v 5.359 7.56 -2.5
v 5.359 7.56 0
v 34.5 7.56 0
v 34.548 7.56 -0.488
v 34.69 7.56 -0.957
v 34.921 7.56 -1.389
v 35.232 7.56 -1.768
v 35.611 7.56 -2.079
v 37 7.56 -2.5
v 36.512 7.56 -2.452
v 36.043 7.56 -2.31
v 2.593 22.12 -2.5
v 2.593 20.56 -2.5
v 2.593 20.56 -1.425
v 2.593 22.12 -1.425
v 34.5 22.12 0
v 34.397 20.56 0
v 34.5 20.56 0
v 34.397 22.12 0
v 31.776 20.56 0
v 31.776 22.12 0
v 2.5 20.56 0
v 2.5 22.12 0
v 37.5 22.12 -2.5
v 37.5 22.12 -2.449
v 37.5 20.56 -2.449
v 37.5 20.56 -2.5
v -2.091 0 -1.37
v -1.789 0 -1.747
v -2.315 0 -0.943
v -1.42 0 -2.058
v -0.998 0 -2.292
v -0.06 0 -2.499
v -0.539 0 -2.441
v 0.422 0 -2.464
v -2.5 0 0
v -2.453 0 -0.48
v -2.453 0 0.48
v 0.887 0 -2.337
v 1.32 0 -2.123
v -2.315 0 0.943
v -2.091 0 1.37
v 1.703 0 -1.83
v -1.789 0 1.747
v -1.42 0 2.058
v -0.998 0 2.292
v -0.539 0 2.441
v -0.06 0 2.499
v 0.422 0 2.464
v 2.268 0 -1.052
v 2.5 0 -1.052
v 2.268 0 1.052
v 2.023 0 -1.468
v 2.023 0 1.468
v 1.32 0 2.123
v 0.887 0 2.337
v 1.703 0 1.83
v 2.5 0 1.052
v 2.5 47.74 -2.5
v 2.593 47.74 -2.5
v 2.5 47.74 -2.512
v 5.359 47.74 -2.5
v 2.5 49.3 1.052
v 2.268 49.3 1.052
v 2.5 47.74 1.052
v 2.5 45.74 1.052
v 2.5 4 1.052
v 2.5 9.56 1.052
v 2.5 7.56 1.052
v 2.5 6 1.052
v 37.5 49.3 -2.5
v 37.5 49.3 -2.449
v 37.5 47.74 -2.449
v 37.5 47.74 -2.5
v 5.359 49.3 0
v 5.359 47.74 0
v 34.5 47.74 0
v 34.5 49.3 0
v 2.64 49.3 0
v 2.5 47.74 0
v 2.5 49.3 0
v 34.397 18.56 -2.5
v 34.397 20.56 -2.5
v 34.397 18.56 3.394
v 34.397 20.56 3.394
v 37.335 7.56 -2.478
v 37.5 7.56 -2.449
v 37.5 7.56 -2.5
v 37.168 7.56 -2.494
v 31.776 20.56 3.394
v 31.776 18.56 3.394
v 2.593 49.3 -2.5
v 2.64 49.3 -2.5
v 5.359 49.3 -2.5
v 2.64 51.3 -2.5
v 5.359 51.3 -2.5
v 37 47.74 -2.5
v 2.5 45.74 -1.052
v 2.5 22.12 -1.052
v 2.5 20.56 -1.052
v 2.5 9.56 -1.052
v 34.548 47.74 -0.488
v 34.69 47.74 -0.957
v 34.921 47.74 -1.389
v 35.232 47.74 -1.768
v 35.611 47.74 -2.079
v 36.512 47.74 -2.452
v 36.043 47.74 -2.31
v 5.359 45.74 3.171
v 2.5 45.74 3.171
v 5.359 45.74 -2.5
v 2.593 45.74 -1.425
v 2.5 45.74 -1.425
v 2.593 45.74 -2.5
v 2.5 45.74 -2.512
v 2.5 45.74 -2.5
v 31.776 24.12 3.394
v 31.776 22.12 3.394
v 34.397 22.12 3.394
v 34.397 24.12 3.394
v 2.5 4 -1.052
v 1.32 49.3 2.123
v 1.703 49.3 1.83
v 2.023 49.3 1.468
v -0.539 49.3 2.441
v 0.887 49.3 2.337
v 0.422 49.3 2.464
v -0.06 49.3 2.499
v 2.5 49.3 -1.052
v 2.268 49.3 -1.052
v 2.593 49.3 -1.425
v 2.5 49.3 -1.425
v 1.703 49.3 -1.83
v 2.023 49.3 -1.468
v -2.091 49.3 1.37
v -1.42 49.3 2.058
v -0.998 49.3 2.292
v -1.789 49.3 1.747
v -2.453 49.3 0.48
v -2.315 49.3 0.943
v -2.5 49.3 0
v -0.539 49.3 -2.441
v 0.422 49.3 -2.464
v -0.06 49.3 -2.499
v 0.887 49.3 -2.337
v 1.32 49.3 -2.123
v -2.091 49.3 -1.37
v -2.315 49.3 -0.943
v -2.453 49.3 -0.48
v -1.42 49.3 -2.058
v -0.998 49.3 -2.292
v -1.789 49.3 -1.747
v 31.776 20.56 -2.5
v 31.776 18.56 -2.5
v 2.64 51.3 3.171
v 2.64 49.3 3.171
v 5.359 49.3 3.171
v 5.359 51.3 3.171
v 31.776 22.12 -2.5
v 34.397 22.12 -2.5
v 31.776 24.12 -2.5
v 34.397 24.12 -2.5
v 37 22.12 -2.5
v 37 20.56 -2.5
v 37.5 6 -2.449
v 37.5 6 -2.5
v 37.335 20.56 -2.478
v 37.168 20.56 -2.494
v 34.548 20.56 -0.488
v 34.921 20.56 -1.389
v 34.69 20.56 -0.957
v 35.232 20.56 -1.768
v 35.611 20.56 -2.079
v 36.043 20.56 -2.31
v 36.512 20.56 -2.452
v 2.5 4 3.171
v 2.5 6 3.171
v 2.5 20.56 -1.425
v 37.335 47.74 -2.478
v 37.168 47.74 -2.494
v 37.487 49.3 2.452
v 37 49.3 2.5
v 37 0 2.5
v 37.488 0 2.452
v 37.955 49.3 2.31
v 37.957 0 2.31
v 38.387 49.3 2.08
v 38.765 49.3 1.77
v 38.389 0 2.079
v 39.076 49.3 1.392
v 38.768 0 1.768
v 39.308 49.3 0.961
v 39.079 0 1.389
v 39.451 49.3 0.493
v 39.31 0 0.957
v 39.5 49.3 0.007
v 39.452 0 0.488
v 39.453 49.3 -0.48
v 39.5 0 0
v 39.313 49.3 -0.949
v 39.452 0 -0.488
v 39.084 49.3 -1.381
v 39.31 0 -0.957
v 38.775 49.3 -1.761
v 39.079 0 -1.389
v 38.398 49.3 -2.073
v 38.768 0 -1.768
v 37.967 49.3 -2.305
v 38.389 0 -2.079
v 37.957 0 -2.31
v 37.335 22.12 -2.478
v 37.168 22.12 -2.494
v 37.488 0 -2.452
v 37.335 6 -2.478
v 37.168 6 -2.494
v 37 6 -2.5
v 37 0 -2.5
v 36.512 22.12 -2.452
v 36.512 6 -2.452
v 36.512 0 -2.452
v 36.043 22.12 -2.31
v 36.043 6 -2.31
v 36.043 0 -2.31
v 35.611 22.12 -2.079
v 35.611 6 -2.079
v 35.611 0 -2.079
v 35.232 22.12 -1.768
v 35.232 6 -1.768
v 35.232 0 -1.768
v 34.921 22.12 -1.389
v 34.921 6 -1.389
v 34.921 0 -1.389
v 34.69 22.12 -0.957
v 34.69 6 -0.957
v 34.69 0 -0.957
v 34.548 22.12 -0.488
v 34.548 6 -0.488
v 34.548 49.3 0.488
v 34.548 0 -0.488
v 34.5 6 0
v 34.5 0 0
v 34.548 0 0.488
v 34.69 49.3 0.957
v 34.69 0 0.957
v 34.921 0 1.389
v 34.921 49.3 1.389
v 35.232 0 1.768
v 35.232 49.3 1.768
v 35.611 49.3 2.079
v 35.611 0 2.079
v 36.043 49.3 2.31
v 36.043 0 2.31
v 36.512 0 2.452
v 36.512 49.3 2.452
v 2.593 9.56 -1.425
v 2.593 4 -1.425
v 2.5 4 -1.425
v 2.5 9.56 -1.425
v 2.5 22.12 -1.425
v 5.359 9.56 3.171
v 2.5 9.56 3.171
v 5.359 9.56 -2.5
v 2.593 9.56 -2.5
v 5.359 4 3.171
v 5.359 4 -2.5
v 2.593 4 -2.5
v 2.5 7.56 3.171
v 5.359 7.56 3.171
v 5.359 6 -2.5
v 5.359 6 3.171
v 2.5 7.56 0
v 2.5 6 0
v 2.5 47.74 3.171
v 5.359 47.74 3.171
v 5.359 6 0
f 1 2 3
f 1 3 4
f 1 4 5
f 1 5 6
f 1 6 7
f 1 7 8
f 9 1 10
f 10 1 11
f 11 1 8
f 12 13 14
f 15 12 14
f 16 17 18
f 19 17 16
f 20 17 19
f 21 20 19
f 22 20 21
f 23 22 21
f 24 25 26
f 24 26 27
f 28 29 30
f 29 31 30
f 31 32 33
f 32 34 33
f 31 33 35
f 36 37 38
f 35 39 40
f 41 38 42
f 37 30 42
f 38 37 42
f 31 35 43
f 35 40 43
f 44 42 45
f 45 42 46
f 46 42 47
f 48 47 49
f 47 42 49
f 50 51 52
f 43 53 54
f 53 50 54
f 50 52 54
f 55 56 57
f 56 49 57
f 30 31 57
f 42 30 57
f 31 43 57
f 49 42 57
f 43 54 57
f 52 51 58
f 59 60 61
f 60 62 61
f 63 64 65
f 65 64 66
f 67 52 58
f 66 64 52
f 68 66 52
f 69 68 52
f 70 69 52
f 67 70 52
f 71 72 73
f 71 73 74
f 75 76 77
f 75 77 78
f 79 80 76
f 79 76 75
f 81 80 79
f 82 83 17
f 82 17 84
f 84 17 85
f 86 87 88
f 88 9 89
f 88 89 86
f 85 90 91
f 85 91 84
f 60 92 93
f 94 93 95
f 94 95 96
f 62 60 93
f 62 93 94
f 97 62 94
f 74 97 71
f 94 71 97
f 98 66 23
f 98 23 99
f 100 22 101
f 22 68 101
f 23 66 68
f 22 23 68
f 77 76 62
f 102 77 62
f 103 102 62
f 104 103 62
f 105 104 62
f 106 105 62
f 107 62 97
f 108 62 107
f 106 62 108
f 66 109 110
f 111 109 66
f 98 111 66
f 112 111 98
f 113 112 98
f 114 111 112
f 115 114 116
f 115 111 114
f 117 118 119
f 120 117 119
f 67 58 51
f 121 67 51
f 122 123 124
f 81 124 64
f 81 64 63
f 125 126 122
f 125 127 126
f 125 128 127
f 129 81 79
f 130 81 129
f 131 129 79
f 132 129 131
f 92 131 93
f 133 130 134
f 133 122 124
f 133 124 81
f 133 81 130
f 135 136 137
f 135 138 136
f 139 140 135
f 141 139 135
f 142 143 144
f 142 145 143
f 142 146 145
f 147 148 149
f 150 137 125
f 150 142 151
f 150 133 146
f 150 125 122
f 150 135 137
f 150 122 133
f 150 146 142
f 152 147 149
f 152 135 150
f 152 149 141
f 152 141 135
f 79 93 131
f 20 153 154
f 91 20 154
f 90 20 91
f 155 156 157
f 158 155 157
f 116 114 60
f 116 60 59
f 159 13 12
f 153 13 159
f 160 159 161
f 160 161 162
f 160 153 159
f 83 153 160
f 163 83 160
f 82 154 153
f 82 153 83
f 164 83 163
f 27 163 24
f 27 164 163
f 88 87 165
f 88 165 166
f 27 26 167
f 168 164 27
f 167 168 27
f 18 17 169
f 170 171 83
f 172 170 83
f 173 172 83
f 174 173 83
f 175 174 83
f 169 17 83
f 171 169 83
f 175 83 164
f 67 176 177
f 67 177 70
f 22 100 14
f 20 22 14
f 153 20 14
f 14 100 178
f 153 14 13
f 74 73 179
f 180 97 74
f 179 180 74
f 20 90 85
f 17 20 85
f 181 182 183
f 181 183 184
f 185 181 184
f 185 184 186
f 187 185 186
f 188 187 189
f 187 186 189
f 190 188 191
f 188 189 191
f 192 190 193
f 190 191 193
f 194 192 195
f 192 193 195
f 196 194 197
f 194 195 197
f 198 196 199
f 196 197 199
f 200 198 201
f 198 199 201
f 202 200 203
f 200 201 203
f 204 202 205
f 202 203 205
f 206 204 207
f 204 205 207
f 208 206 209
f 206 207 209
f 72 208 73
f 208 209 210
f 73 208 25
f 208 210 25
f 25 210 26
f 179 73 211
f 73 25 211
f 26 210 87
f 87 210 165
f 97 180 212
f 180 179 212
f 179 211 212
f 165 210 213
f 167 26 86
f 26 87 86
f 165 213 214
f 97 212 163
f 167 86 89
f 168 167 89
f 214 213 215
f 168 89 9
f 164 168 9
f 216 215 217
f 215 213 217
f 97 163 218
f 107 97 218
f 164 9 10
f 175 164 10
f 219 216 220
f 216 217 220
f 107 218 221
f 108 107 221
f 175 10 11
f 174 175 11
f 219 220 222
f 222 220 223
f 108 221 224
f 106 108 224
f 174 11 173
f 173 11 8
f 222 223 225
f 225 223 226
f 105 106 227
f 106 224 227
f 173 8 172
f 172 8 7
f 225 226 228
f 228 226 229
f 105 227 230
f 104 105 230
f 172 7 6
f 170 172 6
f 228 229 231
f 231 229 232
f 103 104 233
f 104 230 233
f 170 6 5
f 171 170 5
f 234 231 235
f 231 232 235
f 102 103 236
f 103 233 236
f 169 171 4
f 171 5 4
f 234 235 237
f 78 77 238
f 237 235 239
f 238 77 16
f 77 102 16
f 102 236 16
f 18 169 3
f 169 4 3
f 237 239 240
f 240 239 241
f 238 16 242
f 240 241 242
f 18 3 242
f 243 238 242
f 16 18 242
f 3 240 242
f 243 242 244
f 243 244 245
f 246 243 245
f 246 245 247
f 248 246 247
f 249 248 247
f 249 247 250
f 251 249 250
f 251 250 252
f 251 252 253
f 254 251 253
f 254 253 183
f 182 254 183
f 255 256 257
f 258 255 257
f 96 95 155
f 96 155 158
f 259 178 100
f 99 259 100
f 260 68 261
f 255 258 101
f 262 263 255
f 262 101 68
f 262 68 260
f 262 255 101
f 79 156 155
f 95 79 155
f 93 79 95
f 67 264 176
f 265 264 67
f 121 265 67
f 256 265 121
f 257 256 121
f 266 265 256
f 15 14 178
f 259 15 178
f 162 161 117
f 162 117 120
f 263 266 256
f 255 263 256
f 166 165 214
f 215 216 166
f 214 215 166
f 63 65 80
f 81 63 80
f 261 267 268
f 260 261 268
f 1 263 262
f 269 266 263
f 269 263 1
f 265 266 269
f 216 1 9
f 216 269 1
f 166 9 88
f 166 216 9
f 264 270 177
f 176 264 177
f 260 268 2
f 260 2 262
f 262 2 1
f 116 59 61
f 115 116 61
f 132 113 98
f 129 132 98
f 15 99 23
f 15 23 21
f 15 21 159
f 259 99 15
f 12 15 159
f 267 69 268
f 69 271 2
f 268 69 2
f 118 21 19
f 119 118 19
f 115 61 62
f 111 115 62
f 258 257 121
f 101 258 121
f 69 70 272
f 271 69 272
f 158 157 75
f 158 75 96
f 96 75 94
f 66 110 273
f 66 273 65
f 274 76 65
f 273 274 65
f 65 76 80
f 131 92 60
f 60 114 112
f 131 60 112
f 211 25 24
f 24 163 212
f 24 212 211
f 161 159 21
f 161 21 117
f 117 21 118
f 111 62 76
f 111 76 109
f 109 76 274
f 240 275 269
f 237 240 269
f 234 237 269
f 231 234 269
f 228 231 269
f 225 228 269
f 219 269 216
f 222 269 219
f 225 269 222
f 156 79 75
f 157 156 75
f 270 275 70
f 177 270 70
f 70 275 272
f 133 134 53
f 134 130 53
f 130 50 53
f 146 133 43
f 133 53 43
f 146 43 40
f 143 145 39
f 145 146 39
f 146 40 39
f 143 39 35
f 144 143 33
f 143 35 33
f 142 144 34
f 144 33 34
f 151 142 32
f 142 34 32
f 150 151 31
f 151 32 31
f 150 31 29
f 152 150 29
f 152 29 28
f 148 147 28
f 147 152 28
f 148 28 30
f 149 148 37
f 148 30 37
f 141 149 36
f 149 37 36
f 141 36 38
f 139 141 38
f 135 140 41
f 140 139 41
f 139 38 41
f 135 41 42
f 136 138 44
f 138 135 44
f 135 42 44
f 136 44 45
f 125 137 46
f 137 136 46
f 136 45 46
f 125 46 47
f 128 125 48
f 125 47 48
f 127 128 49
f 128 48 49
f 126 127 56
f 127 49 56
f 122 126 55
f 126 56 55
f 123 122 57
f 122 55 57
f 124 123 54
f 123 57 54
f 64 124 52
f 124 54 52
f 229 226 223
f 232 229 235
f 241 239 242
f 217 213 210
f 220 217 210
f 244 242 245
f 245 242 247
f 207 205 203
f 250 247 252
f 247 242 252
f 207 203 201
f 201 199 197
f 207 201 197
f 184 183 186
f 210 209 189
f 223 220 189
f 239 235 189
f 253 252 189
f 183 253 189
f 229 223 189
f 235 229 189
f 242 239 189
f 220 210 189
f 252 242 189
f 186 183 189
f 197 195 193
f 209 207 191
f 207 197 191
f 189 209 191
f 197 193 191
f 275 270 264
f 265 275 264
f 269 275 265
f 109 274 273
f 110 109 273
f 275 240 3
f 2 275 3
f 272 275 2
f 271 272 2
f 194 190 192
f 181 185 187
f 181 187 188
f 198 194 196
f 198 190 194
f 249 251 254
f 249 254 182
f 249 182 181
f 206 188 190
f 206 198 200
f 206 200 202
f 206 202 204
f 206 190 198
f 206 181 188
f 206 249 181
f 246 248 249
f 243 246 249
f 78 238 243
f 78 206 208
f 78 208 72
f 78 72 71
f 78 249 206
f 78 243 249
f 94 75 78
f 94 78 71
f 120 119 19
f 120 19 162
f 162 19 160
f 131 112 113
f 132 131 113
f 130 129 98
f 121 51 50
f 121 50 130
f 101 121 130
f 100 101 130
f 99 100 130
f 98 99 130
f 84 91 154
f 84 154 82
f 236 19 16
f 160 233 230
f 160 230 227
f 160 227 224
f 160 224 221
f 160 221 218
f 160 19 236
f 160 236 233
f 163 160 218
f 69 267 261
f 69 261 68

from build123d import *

# Parameters (mm, degrees)
SKETCH2_R             = 2.5
BOSS_EXTRUDE1_DEPTH   = 49.3
BOSS_EXTRUDE1_2_DEPTH = 49.3
BOSS_EXTRUDE2_DEPTH   = 49.3
SKETCH4_W             = 2.5
SKETCH4_H             = 1.56
BOSS_EXTRUDE4_DEPTH   = 35
BOSS_EXTRUDE8_DEPTH   = 2
SKETCH15_W            = 2.621045261
SKETCH15_H            = 5.894157502
BOSS_EXTRUDE10_DEPTH  = 2
SKETCH16_W            = 2.858555501
SKETCH16_H            = 5.670918984
BOSS_EXTRUDE11_DEPTH  = 2
SKETCH17_W            = 2.858555501
SKETCH17_H            = 5.670918984
BOSS_EXTRUDE12_DEPTH  = 2
BOSS_EXTRUDE13_DEPTH  = 2
SKETCH21_W            = 2.718681831
SKETCH21_H            = 5.670918984
BOSS_EXTRUDE16_DEPTH  = 2
SKETCH22_W            = 0.232218322
SKETCH22_H            = 1.447780317
CUT_EXTRUDE3_DEPTH    = 49.4


with BuildPart() as part:
    # Sketch2 → Boss-Extrude1 (new body)
    with BuildSketch(Plane(origin=(0, 0, 0), x_dir=(1, 0, 0), z_dir=(0, 1, 0))):
        with Locations(Location((0, 0, 0), (0, 0, 270))):
            Circle(SKETCH2_R)
    extrude(amount=BOSS_EXTRUDE1_DEPTH)

    # Sketch3 → Boss-Extrude2 (add)
    with BuildSketch(Plane(origin=(0, 0, 0), x_dir=(1, 0, 0), z_dir=(0, 1, 0))):
        with BuildLine():
            Line((2.5, 0), (2.499588142, -0.045377544))
            ThreePointArc((2.499588142, -0.045377544), (2.436264871, -0.560904161), (2.267781678, -1.052219683))
            Line((2.267781678, -1.052219683), (2.267781678, -2.5))
            Line((2.267781678, -2.5), (2.5, -2.5))
            Line((2.5, -2.5), (2.5, 0))
        make_face()
        with BuildLine():
            ThreePointArc((2.267781678, 1.052219683), (2.44125523, 0.538769805), (2.5, 0))
            Line((2.5, 0), (2.5, 2.5))
            Line((2.5, 2.5), (2.267781678, 2.5))
            Line((2.267781678, 2.5), (2.267781678, 1.052219683))
        make_face()
    extrude(amount=BOSS_EXTRUDE2_DEPTH)



with BuildPart() as body_2:
    # Sketch2 → Boss-Extrude1 2 (new body)
    with BuildSketch(Plane(origin=(0, 0, 0), x_dir=(1, 0, 0), z_dir=(0, 1, 0))):
        with Locations(Location((37, 0, 0), (0, 0, 270))):
            Circle(SKETCH2_R)
    extrude(amount=BOSS_EXTRUDE1_2_DEPTH)


with BuildPart() as part_1:
    add(part.part)

    add(body_2.part)  # Boss-Extrude4 merges body 2
    # Sketch4 → Boss-Extrude4 (add)
    with BuildSketch(Plane(origin=(2.5, 0, 0), x_dir=(0, 0, -1), z_dir=(1, 0, 0))):
        with Locations((1.25, 48.52)):
            Rectangle(SKETCH4_W, SKETCH4_H)
        with Locations((1.25, 21.34)):
            Rectangle(SKETCH4_W, SKETCH4_H)
        with Locations((1.25, 6.78)):
            Rectangle(SKETCH4_W, SKETCH4_H)
    extrude(amount=BOSS_EXTRUDE4_DEPTH)

    # Sketch10 → Boss-Extrude8 (add)
    with BuildSketch(Plane(origin=(0, 22.12, 0), x_dir=(1, 0, 0), z_dir=(0, 1, 0))):
        Polygon((31.775974476, 2.5), (31.775974476, -0.65349723), (31.775974476, -2.529631849), (31.775974476, -3.394157502), (34.397019737, -3.394157502), (34.397019737, -2.529631849), (34.397019737, -0.644583093), (34.397019737, 2.5), align=None)
    extrude(amount=BOSS_EXTRUDE8_DEPTH)

    # Sketch15 → Boss-Extrude10 (add)
    with BuildSketch(Plane.XZ.offset(-20.56)):
        with Locations((33.086497107, 0.447078751)):
            Rectangle(SKETCH15_W, SKETCH15_H)
    extrude(amount=BOSS_EXTRUDE10_DEPTH)

    # Sketch16 → Boss-Extrude11 (add)
    with BuildSketch(Plane(origin=(0, 7.56, 0), x_dir=(1, 0, 0), z_dir=(0, 1, 0))):
        with Locations((3.929277751, -0.335459492)):
            Rectangle(SKETCH16_W, SKETCH16_H)
    extrude(amount=BOSS_EXTRUDE11_DEPTH)

    # Sketch17 → Boss-Extrude12 (add)
    with BuildSketch(Plane(origin=(0, 6, 0), x_dir=(-1, 0, 0), z_dir=(0, -1, 0))):
        with Locations((-3.929277751, -0.335459492)):
            Rectangle(SKETCH17_W, SKETCH17_H)
    extrude(amount=BOSS_EXTRUDE12_DEPTH)

    # Sketch18 → Boss-Extrude13 (add)
    with BuildSketch(Plane(origin=(0, 47.74, 0), x_dir=(-1, 0, 0), z_dir=(0, -1, 0))):
        Polygon((-2.5, 2.512386099), (-5.358555501, 2.5), (-5.358555501, -3.170918984), (-2.5, -3.170918984), align=None)
    extrude(amount=BOSS_EXTRUDE13_DEPTH)

    # Sketch21 → Boss-Extrude16 (add)
    with BuildSketch(Plane(origin=(0, 49.3, 0), x_dir=(1, 0, 0), z_dir=(0, 1, 0))):
        with Locations((3.999214586, -0.335459492)):
            Rectangle(SKETCH21_W, SKETCH21_H)
    extrude(amount=BOSS_EXTRUDE16_DEPTH)

    # Sketch22 → Cut-Extrude3 (cut)
    with BuildSketch(Plane(origin=(0, 0, 0), x_dir=(1, 0, 0), z_dir=(0, 1, 0))):
        Polygon((2.267781678, 1.052219683), (2.267781678, 2.5), (2.5, 2.5), (2.593422148, 2.5), (2.593422148, 1.424983609), (2.5, 1.424983609), (2.5, 1.052219683), align=None)
        with Locations((2.383890839, -1.776109842)):
            Rectangle(SKETCH22_W, SKETCH22_H)
    extrude(amount=CUT_EXTRUDE3_DEPTH, mode=Mode.SUBTRACT)


solid = part_1.part
